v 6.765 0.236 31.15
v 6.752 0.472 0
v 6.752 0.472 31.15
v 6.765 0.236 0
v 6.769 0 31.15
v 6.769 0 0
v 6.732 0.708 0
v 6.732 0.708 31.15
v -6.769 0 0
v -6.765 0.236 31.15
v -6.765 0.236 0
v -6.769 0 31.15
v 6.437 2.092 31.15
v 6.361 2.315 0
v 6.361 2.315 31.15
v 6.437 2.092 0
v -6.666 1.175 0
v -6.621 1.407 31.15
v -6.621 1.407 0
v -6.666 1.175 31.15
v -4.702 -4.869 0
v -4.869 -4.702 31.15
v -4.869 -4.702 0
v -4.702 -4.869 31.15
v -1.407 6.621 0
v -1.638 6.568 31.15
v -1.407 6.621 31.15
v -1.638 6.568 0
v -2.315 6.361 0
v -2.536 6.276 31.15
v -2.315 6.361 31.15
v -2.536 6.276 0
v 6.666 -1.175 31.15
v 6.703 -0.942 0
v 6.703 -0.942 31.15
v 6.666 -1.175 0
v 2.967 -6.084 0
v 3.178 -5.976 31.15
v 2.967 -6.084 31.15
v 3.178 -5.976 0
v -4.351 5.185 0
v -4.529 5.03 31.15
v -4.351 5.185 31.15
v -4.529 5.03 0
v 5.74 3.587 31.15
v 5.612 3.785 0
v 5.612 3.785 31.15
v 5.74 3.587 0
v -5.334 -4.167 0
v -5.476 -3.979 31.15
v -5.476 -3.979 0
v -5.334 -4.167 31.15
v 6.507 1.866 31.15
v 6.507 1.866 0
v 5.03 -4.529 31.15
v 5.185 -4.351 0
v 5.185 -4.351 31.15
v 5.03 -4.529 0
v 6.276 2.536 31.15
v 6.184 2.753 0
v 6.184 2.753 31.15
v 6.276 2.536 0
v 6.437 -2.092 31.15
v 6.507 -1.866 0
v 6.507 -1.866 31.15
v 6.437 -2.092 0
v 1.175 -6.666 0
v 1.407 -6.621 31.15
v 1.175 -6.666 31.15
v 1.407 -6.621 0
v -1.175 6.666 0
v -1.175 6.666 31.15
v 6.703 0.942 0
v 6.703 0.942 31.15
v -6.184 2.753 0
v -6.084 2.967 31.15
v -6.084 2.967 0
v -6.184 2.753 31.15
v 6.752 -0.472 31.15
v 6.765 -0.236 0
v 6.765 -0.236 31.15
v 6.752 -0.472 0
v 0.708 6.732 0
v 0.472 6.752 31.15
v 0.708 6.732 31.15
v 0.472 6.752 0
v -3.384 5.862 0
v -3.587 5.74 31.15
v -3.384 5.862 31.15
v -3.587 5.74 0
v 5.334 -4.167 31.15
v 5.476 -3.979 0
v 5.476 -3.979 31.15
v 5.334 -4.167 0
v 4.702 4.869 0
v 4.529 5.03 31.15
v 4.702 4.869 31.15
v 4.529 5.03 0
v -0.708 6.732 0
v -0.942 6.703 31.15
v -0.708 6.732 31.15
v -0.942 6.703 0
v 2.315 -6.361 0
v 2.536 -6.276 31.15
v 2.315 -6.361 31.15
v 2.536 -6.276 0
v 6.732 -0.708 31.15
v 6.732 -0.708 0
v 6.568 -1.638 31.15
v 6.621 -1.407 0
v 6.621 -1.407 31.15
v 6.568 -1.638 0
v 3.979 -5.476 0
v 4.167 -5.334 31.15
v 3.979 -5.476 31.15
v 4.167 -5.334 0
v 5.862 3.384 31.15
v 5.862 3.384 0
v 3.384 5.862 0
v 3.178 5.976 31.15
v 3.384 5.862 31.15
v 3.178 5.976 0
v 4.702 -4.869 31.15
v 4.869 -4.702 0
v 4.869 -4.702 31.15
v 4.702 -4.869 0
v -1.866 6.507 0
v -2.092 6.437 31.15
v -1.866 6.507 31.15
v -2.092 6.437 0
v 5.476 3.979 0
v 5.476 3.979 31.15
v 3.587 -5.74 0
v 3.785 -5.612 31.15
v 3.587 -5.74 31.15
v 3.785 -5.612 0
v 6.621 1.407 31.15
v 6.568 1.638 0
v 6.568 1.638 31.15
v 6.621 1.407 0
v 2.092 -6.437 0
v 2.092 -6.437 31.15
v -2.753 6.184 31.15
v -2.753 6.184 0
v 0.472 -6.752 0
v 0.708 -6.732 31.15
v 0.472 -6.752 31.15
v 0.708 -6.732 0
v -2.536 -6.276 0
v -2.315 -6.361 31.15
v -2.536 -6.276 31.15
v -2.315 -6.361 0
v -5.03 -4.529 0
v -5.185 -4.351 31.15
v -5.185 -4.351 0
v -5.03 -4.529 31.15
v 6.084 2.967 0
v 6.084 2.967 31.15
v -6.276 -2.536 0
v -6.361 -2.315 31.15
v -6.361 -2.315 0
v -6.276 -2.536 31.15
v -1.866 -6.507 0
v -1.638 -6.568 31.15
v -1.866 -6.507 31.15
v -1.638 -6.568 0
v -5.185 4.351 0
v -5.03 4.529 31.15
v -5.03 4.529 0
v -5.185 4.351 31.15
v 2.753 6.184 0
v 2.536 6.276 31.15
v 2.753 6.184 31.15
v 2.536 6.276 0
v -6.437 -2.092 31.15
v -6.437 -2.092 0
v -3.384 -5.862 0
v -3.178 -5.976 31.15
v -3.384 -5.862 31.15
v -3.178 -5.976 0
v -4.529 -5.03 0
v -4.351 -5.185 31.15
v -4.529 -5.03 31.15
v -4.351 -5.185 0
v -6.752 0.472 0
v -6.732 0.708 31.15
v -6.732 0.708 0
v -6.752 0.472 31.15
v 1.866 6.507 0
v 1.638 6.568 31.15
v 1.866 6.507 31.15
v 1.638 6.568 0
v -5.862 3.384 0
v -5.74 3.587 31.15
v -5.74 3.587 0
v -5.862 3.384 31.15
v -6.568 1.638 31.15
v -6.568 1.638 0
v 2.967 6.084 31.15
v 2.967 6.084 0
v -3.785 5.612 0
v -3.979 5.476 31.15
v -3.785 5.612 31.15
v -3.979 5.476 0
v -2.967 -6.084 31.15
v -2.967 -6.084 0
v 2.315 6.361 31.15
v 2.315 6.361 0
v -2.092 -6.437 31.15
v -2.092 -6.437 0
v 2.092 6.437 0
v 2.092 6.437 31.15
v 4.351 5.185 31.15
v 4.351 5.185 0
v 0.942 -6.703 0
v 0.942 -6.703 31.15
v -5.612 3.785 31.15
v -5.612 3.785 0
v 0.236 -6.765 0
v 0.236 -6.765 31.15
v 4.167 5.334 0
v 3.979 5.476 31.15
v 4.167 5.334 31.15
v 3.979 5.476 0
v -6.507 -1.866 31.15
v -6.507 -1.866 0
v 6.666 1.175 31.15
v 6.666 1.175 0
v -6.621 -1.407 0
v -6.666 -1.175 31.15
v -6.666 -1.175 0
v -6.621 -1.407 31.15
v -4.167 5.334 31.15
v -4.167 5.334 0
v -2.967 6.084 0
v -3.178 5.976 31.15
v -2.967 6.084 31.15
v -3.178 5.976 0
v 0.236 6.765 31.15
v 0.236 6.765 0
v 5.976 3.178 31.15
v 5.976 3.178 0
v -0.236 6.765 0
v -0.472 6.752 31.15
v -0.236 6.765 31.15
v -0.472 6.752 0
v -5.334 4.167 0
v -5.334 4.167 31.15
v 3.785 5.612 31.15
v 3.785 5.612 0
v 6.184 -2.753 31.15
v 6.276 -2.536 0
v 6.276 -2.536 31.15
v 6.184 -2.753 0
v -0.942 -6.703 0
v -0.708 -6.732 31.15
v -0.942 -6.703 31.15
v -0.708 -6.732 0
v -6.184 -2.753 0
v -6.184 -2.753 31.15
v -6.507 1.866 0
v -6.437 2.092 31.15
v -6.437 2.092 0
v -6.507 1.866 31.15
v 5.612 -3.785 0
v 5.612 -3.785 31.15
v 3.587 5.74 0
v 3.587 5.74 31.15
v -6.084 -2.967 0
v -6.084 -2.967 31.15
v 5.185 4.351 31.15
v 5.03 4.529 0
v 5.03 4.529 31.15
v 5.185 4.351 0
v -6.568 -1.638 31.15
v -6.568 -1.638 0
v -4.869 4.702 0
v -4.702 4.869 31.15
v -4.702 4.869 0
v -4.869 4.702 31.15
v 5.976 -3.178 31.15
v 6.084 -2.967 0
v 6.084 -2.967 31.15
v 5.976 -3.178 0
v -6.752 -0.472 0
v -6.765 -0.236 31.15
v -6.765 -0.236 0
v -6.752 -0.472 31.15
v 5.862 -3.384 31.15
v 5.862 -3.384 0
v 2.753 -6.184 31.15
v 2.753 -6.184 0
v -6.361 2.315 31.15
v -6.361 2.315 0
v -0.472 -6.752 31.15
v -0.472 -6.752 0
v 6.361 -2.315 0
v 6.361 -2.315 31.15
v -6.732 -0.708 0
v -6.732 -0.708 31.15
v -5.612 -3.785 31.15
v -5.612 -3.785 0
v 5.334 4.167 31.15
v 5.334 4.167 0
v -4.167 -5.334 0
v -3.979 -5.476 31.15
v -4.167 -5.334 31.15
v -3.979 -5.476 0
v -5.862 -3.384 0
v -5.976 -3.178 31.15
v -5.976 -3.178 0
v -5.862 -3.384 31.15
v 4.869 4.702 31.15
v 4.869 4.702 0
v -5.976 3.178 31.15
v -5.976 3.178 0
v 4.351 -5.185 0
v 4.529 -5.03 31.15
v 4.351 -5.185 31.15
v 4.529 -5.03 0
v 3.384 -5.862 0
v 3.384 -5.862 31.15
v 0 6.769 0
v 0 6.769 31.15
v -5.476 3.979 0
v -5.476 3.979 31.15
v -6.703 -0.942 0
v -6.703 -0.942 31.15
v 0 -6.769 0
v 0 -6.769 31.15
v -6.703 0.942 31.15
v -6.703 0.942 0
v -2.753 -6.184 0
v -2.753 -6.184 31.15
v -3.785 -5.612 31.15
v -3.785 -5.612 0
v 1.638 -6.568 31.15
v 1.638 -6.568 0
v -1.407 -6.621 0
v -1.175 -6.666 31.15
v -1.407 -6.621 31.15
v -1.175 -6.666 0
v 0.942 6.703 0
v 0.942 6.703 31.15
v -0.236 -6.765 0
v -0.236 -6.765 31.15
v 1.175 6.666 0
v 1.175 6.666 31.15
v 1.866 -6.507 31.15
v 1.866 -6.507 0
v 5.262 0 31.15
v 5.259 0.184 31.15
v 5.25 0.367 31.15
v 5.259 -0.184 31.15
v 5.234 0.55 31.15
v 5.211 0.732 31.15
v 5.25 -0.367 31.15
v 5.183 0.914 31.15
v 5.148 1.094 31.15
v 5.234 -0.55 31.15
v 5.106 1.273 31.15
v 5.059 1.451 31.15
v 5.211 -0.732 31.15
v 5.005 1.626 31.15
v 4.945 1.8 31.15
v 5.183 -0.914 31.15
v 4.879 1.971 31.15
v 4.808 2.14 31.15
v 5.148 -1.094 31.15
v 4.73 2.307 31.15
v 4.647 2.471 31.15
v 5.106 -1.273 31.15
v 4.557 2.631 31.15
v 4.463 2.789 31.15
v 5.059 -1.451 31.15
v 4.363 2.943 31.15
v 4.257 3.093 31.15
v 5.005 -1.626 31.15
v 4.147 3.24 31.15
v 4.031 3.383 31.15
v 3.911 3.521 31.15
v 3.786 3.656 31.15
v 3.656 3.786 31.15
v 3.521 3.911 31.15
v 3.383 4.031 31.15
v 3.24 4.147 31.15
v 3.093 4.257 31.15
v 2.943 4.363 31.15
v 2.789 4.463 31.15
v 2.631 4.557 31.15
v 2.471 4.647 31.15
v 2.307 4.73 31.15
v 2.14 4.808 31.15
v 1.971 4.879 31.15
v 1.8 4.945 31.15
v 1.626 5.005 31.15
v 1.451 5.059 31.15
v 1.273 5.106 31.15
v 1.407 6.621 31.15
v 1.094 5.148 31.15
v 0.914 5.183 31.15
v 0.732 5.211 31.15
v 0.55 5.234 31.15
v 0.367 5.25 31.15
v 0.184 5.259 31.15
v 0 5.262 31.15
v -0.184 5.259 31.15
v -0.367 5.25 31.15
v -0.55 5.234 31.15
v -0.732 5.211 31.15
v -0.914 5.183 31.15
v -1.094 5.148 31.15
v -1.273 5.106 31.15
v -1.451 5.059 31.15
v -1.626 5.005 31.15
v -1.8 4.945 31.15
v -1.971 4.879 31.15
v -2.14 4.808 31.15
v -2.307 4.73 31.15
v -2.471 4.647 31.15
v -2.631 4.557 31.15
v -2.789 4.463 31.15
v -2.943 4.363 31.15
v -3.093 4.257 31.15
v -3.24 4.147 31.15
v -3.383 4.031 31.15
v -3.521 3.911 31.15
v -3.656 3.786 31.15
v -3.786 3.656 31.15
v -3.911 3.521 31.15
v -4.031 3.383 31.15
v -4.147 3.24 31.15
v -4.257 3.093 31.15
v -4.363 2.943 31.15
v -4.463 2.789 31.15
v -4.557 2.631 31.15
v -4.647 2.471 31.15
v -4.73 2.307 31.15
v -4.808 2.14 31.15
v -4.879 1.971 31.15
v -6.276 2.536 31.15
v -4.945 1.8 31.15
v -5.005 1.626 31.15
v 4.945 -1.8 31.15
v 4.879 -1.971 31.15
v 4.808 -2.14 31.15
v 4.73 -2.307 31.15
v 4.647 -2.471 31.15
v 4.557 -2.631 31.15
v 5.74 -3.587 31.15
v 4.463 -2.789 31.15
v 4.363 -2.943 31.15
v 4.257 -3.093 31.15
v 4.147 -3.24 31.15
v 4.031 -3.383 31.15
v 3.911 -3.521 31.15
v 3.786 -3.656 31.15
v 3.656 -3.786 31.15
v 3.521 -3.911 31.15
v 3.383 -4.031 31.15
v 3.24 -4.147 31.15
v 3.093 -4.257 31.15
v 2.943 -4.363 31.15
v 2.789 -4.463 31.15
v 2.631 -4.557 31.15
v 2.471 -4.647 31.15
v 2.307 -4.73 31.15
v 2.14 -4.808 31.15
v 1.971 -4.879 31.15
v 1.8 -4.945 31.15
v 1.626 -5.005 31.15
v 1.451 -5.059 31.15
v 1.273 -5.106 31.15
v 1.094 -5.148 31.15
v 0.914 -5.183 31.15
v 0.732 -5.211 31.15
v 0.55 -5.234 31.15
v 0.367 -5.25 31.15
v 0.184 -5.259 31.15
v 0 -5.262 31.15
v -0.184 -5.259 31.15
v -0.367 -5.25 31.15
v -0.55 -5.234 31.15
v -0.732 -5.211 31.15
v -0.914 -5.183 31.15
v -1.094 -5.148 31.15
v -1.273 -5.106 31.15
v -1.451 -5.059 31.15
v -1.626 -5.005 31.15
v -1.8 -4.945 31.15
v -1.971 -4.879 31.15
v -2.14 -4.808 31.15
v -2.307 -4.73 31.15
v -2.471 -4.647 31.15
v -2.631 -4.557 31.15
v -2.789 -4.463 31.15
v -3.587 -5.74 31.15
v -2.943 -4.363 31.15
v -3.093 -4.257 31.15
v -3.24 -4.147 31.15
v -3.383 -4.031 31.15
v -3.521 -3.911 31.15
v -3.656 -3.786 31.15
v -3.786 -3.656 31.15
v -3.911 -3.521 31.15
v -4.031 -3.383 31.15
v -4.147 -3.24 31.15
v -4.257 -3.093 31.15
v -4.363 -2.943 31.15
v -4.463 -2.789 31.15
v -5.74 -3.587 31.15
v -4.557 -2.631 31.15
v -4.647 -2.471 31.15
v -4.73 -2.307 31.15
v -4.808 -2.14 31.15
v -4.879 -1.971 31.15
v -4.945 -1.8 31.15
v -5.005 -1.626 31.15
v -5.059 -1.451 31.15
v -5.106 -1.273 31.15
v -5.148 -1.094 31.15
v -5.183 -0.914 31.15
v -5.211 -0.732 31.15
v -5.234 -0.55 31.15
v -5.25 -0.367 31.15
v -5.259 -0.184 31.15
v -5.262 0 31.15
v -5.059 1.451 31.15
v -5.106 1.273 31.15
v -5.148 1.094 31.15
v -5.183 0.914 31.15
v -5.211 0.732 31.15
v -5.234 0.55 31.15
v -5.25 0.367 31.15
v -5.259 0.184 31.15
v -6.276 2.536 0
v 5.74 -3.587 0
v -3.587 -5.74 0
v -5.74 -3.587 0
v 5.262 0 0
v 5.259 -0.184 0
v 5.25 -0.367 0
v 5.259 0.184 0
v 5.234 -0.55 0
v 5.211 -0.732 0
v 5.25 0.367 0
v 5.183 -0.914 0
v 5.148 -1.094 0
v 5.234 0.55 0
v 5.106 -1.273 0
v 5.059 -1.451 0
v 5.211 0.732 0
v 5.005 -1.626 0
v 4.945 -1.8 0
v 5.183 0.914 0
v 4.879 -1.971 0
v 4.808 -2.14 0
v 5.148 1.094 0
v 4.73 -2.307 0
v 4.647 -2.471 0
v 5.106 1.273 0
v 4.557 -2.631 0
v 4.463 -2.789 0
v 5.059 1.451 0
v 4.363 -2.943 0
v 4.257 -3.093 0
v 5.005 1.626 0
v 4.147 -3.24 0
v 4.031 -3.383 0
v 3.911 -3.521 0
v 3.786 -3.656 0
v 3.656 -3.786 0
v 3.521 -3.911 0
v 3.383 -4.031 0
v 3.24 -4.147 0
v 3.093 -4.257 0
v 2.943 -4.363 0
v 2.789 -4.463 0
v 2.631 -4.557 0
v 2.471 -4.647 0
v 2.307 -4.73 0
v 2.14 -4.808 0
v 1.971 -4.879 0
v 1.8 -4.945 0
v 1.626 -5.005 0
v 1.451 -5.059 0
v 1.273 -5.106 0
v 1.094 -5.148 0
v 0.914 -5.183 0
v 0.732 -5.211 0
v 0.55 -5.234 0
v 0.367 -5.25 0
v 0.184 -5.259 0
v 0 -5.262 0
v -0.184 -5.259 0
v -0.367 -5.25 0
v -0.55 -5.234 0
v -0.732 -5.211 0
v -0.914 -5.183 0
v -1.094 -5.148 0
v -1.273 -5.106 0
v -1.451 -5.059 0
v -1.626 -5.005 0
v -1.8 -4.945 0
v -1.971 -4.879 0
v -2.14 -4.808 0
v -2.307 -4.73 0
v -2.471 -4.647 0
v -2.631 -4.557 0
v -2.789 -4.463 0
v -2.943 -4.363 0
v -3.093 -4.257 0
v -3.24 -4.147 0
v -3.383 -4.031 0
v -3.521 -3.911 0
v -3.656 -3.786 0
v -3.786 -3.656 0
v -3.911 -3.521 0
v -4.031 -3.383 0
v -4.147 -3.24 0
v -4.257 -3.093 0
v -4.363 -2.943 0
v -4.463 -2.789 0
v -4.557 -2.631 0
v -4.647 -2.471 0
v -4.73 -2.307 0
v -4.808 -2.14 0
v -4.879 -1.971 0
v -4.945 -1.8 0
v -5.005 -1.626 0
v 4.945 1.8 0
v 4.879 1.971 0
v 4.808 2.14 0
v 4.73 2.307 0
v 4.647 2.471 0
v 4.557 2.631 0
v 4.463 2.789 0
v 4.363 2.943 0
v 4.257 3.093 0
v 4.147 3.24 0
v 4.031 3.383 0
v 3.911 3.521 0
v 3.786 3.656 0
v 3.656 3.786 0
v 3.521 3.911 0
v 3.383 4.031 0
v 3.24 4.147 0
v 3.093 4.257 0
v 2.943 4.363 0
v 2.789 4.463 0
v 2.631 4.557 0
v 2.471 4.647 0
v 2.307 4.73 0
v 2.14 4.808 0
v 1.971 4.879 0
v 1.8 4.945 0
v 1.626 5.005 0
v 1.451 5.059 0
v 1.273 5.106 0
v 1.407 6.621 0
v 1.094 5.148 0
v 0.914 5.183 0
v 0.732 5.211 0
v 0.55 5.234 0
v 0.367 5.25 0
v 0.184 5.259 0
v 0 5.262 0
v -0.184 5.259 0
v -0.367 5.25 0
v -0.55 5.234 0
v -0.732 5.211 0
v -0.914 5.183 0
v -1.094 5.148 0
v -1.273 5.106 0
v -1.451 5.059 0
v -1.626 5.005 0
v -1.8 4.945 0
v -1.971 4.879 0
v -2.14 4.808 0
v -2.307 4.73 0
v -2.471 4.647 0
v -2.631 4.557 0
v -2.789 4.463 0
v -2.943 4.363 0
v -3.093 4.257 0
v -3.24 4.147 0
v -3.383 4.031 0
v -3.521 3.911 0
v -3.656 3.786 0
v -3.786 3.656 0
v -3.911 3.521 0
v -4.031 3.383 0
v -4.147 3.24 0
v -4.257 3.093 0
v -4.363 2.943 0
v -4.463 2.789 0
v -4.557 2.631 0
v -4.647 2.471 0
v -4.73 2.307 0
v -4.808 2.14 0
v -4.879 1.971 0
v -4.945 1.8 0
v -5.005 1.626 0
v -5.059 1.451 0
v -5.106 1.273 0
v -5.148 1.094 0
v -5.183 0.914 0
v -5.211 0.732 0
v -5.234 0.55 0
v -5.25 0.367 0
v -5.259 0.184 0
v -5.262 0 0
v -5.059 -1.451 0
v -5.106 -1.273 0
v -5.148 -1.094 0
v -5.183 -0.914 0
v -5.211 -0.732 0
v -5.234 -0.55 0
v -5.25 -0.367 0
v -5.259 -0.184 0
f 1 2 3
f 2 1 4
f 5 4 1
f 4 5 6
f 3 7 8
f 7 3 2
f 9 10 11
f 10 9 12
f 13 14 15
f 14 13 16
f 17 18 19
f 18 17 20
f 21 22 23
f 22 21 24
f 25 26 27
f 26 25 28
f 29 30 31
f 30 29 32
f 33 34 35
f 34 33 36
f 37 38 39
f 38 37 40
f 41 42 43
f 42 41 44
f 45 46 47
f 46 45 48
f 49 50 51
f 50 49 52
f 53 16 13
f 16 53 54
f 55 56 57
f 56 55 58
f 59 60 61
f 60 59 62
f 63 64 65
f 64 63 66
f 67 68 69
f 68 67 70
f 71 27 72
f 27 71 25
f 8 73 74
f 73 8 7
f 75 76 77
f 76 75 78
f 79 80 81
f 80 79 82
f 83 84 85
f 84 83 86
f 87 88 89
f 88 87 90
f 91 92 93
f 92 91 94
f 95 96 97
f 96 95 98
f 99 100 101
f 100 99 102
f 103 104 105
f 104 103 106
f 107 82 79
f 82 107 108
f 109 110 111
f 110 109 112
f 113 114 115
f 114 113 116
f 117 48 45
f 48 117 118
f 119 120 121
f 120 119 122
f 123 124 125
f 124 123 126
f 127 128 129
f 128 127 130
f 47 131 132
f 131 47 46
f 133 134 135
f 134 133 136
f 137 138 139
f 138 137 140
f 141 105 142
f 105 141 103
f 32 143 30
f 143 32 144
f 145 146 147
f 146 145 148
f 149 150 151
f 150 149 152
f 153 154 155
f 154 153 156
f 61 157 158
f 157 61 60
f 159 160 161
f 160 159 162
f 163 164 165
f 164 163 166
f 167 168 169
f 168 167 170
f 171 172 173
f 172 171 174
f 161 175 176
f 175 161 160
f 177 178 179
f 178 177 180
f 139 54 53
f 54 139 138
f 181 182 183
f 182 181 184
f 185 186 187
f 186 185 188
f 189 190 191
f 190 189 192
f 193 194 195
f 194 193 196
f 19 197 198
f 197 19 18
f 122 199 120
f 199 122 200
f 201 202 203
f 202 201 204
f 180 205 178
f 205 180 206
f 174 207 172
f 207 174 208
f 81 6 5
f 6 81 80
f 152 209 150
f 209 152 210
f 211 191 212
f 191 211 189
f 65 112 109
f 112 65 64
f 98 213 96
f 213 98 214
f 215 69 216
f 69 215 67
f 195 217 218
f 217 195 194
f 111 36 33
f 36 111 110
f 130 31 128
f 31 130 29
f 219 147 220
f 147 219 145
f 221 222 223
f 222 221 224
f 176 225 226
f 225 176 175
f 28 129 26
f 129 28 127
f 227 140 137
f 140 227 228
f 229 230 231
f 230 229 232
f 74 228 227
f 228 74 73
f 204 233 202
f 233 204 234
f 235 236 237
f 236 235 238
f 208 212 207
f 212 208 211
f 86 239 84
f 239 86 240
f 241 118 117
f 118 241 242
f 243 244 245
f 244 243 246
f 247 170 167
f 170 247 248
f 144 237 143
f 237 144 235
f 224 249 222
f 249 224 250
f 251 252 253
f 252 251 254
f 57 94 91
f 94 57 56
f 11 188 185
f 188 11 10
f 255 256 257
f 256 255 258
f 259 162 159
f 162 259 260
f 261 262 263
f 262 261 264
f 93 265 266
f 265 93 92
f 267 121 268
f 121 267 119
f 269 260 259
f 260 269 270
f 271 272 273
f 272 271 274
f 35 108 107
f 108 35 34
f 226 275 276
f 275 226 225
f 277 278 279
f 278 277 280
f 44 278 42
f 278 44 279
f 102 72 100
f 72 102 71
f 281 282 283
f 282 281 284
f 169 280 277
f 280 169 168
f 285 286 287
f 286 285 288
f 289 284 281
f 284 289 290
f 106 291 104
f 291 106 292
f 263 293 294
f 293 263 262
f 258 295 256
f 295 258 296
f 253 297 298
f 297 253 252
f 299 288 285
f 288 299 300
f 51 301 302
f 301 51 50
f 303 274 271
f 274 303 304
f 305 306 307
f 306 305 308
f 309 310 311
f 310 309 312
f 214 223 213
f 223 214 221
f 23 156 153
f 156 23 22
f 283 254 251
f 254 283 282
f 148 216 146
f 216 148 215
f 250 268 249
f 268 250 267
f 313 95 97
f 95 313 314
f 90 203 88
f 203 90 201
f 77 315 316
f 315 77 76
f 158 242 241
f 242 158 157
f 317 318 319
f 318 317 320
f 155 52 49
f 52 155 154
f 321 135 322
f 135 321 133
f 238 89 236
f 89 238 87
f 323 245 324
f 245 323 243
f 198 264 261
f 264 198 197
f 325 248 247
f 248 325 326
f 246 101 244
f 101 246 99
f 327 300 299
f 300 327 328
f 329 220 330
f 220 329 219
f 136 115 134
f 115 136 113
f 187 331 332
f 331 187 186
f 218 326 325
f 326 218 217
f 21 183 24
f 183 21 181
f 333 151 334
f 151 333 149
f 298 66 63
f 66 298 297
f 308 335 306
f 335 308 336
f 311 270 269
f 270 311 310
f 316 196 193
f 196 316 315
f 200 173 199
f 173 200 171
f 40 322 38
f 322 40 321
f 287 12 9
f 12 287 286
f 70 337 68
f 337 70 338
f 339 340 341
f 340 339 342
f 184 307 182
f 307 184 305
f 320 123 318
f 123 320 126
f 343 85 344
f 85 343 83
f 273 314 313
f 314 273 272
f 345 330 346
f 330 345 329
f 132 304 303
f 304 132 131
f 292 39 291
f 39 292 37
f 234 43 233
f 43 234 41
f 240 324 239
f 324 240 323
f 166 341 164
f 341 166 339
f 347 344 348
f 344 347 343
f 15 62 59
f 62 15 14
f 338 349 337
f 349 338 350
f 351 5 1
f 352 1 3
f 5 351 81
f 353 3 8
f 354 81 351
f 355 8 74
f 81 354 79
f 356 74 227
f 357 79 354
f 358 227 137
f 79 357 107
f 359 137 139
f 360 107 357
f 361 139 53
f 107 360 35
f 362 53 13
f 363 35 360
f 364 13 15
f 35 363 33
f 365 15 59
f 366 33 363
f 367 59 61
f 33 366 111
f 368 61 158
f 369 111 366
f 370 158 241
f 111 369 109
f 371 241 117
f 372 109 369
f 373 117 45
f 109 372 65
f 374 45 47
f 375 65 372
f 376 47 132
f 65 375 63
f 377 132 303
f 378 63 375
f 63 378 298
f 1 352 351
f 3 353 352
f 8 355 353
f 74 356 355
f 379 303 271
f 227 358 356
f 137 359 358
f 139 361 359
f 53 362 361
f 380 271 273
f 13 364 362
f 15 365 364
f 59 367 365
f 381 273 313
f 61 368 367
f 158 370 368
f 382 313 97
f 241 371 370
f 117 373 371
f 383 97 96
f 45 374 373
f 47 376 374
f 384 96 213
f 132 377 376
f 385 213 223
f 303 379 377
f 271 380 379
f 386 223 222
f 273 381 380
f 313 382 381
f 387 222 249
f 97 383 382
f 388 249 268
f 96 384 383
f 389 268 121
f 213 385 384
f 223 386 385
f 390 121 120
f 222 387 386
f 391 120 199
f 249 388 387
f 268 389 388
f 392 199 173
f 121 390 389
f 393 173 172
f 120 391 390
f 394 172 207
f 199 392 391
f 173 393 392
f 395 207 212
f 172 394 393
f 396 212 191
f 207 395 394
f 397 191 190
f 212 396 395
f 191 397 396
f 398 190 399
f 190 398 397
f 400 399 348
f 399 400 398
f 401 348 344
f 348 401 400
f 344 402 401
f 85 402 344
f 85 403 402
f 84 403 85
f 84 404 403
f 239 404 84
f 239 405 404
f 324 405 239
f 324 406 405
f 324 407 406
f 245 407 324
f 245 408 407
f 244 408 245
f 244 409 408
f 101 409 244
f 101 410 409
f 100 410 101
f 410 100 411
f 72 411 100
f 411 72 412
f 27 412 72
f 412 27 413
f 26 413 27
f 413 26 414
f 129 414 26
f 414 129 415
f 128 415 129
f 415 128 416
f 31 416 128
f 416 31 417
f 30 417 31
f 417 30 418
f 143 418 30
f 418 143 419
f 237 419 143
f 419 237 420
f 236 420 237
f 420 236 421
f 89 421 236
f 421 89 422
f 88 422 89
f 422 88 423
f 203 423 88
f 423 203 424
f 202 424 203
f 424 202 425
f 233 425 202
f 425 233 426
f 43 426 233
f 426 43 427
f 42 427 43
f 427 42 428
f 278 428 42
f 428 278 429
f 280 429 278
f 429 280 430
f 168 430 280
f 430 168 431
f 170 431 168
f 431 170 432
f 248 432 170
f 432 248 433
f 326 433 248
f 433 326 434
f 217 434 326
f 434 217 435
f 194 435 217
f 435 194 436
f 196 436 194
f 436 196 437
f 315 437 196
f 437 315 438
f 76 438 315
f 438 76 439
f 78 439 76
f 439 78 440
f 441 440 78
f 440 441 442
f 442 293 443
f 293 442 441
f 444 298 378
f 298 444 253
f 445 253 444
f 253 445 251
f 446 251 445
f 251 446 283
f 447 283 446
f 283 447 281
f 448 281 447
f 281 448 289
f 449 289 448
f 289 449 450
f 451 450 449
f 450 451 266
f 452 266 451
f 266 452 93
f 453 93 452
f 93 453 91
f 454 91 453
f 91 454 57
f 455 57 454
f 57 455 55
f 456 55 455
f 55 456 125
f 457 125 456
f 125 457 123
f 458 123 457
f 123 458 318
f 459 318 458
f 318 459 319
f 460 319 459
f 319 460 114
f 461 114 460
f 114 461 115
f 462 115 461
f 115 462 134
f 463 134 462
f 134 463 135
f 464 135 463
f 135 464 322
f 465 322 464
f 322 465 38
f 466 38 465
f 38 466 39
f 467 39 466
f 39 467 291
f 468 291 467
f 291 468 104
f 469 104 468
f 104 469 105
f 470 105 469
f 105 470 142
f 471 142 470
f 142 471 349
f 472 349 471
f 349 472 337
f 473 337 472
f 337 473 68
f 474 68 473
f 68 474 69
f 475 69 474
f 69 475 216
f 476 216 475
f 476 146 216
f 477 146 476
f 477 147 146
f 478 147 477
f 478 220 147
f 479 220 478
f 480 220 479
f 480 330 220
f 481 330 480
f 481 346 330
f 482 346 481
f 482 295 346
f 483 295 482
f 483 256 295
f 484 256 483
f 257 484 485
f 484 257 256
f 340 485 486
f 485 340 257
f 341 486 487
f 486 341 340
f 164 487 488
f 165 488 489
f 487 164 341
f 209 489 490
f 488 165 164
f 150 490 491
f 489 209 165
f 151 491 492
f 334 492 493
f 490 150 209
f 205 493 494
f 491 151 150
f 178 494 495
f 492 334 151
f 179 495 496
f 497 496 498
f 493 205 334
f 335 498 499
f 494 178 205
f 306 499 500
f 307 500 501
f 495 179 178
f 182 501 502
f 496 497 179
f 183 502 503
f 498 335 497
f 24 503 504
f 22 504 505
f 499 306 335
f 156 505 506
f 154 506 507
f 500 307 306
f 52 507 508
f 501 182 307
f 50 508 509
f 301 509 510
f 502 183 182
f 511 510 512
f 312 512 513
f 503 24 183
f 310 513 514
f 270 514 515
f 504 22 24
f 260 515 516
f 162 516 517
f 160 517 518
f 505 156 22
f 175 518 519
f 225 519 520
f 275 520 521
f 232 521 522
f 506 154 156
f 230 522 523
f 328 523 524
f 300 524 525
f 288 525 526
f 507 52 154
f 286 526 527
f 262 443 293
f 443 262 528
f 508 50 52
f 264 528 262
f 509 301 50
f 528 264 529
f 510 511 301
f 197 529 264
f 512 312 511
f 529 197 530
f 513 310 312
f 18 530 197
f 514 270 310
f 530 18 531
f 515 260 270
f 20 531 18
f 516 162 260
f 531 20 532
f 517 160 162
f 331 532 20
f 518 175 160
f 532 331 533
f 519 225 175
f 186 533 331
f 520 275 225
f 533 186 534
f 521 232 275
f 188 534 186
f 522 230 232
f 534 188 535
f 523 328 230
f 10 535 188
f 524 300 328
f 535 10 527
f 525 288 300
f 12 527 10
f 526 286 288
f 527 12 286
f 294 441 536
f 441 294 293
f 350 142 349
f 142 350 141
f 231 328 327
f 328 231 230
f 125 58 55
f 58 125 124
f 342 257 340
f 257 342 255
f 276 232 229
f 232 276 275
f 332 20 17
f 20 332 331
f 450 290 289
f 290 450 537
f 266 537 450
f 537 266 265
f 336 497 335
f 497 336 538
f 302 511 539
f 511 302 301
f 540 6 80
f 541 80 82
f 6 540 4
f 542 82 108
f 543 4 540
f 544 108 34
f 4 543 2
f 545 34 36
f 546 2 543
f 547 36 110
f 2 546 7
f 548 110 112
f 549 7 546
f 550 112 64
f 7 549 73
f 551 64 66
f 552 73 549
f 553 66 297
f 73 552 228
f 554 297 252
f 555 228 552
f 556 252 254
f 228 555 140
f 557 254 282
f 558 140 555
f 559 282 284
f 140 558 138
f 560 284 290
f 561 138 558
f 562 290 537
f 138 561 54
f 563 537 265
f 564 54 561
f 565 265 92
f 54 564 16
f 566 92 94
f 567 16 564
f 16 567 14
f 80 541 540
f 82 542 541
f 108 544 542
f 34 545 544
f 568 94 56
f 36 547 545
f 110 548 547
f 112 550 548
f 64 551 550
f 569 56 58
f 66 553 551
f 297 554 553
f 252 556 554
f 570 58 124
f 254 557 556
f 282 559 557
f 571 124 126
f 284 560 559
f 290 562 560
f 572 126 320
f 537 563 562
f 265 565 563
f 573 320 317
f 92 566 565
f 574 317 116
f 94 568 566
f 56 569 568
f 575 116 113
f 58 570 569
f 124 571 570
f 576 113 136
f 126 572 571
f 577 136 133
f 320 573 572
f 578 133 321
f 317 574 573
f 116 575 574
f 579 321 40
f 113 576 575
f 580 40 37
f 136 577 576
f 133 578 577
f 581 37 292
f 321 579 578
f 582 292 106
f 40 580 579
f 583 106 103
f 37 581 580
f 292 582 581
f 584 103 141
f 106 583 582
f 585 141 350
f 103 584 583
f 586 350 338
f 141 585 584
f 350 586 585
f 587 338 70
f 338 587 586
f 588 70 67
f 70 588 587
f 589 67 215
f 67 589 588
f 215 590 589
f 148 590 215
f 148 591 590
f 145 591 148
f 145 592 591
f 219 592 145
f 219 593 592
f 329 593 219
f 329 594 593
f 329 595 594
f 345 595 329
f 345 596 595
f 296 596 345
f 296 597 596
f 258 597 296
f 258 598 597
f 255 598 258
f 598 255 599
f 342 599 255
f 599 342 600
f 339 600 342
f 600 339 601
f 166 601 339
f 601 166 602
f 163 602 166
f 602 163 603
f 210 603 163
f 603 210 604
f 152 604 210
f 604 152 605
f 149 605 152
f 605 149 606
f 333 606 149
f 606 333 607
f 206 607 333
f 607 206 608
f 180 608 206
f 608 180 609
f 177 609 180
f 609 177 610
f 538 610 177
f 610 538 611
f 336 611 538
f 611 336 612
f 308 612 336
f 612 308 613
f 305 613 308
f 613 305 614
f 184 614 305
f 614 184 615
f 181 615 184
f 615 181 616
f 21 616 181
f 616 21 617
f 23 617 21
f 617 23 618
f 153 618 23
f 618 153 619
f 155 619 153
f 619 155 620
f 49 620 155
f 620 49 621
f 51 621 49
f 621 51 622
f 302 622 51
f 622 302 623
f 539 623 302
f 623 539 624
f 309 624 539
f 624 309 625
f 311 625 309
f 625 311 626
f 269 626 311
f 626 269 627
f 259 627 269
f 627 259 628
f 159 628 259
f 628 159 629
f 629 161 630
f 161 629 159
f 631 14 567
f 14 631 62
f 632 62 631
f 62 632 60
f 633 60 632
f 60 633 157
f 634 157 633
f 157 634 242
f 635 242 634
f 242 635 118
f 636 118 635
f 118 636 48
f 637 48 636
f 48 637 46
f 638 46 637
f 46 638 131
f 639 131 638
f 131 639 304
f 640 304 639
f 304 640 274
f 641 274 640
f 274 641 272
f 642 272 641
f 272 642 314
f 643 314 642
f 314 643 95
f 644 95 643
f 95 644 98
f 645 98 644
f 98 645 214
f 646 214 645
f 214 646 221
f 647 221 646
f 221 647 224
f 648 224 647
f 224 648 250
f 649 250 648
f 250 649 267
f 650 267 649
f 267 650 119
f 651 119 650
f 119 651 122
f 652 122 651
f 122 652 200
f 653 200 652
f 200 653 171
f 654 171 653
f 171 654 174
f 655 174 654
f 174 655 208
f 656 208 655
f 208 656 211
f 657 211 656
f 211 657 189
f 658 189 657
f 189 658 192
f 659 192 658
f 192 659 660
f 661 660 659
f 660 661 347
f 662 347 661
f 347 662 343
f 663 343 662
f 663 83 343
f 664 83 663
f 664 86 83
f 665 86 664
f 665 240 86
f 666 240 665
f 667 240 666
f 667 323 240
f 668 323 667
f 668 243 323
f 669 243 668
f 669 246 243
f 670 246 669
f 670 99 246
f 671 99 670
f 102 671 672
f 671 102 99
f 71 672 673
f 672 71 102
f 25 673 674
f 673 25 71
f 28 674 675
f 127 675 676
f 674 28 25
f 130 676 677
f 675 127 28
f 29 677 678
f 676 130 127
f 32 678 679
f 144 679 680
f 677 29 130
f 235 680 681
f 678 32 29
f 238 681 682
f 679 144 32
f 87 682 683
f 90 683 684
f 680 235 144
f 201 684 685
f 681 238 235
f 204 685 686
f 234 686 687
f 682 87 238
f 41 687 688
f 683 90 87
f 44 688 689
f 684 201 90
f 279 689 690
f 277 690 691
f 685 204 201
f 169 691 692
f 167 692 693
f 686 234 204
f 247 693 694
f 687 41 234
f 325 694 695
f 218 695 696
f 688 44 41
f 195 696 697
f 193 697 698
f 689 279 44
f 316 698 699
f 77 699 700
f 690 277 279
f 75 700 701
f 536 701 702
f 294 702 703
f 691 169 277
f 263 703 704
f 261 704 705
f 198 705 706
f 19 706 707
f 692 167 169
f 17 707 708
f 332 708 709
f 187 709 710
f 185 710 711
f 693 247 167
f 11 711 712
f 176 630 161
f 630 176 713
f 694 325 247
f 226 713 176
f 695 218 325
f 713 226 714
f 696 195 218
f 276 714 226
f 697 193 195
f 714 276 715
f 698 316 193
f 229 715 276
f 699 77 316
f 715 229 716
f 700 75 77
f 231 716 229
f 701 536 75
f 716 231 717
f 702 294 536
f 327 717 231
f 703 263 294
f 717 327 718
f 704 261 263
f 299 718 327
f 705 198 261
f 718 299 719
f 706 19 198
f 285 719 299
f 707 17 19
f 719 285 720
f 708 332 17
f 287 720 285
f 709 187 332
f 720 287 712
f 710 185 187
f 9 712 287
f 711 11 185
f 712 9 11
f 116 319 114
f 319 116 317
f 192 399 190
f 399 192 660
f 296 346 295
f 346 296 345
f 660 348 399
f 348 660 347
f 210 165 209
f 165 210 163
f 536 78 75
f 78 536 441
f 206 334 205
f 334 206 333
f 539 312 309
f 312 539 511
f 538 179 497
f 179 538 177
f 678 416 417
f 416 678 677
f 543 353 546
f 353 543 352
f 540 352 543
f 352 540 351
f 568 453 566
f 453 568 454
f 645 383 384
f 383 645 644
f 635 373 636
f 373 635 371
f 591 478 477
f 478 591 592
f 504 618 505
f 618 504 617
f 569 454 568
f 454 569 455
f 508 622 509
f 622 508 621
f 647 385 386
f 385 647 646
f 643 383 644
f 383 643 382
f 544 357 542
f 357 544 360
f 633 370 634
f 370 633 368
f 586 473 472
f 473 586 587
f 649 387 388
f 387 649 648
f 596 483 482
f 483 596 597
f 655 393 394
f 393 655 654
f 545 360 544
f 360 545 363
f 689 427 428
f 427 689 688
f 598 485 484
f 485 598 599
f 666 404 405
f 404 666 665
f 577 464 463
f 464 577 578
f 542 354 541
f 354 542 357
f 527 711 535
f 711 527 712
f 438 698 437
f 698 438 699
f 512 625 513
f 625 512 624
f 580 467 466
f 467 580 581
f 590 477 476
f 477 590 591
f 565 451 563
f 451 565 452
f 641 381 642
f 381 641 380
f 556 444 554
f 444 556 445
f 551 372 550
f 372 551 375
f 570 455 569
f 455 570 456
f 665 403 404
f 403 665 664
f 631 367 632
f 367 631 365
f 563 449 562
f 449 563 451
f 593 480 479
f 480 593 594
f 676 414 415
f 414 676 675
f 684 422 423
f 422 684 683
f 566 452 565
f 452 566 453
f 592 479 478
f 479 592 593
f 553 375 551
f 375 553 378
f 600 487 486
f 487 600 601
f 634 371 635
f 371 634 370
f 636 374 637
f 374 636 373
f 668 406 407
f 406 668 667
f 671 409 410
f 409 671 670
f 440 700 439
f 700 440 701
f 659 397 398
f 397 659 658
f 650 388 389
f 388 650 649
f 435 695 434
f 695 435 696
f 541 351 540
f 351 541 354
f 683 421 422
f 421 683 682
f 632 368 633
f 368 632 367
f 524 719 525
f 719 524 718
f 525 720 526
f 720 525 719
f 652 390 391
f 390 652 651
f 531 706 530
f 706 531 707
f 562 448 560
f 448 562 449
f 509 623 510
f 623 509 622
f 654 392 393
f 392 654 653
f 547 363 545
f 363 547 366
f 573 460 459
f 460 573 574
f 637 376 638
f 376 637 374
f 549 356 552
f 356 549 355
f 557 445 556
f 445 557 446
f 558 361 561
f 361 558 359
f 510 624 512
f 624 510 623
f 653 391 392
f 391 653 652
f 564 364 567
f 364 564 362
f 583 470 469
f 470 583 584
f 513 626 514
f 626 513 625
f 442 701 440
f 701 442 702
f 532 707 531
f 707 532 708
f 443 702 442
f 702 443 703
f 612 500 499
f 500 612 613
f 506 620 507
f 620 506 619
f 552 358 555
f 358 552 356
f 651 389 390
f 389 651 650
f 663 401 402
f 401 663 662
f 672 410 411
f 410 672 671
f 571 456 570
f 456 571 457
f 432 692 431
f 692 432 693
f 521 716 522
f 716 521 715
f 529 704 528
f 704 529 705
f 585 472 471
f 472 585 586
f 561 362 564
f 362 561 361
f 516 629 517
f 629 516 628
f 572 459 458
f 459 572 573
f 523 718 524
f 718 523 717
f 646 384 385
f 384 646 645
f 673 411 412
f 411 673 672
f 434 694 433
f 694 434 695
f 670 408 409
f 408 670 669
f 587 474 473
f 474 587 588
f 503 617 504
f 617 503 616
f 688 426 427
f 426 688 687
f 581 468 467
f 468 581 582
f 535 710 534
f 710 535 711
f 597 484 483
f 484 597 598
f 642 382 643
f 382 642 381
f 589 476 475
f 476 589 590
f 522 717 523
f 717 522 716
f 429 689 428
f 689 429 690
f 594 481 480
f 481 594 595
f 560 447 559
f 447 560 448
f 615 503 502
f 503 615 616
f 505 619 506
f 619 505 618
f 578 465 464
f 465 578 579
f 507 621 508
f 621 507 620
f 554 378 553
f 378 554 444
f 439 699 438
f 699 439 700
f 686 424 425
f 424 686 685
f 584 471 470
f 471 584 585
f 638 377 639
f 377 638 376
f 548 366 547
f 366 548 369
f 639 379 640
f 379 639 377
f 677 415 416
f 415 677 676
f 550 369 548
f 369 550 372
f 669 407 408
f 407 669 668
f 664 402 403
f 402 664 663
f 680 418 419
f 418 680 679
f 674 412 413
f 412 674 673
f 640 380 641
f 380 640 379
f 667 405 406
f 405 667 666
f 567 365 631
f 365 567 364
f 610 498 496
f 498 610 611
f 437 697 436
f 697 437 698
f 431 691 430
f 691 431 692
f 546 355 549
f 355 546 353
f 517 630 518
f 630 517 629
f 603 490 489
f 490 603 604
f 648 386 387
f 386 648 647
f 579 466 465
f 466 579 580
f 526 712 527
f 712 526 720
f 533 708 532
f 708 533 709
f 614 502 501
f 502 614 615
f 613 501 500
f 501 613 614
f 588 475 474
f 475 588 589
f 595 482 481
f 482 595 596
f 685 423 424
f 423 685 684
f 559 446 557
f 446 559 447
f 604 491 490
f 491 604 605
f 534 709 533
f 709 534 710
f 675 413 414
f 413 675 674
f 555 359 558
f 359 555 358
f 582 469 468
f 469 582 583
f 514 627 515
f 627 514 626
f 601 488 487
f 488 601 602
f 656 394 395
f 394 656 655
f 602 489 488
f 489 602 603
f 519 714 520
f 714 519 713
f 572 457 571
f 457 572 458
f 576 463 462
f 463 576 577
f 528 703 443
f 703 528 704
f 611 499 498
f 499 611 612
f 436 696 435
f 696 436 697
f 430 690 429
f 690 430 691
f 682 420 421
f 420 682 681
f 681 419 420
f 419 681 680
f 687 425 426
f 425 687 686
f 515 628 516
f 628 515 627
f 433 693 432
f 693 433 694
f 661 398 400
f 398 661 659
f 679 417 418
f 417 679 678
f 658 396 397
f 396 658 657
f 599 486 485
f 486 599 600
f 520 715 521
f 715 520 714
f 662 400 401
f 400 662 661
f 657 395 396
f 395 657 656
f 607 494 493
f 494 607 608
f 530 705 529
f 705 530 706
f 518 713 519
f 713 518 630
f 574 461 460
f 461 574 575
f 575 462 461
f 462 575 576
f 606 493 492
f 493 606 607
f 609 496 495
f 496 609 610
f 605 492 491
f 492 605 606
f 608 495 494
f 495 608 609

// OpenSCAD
// file: interfaces.scad
/*
 Interface definitions between printed parts

 Dr. Orion Lawlor, lawlor@alaska.edu, 2025-09-29 (Public Domain)
*/

$fs=0.1; $fa=2; // smooth finish

inch=25.4; // file units are mm

sparOD=2.0*inch+0.4; // spar size (plus some clearance)
sparR=3.0; // rounding on corners

module spar2D(enlarge=0,round=1) {
    offset(r=+round*sparR+enlarge) offset(r=-round*sparR)
        square(sparOD*[1,1],center=true);
}

// Clearance for bolts on spar X axis
module spar2Dbolts(enlarge=0) {
    deep=8; // space for 3/8" bolt head
    wide=20; // space for hex, plus some clearance
    round=3;
    offset(r=+round) offset(r=-round)
    offset(r=-round) offset(r=+round)
    {
        spar2D(enlarge=enlarge);
        offset(r=+enlarge)
            square([sparOD+2*deep,wide],center=true);
    }
    
}

sparbolt=3/8*inch+0.5; // diameter of bolts going through spar

rollerR = 9/16/2*inch; // rolling radius of rollers (bare steel) on top of spar
rollerOD = 40; // clearance diameter of outside of roller flanges

ZrollerZ = 1.0*inch; // width of roller
ZrollerMD = 1.5*inch; // maximum diameter of roller
ZrollerDX = 1.0*inch; // shift from surface of spar to surface of next spar
ZrollerSX = 1.75*inch; // shift from center of spar to center of Z roller 
Zroller_bolt=3/8*inch; // axle bolt
// main file
/*
 Spacer tube to hold two bearings apart on the roller bolt.
*/
include <interfaces.scad>;

bearingID=3/8*inch+0.4; // space for bolt
bearingOD=9/16*inch+0.25; // cavity for bearing (with clearance)
bearingZ=3/8*inch+0.5; // height of bearing


tubeZ = sparOD - 2*bearingZ;
tubeID = sparbolt+0.5;
tubeOD = bearingOD - 1.0;

difference() {
    cylinder(d=tubeOD,h=tubeZ);
    cylinder(d=tubeID,h=3*tubeZ,center=true);
}
